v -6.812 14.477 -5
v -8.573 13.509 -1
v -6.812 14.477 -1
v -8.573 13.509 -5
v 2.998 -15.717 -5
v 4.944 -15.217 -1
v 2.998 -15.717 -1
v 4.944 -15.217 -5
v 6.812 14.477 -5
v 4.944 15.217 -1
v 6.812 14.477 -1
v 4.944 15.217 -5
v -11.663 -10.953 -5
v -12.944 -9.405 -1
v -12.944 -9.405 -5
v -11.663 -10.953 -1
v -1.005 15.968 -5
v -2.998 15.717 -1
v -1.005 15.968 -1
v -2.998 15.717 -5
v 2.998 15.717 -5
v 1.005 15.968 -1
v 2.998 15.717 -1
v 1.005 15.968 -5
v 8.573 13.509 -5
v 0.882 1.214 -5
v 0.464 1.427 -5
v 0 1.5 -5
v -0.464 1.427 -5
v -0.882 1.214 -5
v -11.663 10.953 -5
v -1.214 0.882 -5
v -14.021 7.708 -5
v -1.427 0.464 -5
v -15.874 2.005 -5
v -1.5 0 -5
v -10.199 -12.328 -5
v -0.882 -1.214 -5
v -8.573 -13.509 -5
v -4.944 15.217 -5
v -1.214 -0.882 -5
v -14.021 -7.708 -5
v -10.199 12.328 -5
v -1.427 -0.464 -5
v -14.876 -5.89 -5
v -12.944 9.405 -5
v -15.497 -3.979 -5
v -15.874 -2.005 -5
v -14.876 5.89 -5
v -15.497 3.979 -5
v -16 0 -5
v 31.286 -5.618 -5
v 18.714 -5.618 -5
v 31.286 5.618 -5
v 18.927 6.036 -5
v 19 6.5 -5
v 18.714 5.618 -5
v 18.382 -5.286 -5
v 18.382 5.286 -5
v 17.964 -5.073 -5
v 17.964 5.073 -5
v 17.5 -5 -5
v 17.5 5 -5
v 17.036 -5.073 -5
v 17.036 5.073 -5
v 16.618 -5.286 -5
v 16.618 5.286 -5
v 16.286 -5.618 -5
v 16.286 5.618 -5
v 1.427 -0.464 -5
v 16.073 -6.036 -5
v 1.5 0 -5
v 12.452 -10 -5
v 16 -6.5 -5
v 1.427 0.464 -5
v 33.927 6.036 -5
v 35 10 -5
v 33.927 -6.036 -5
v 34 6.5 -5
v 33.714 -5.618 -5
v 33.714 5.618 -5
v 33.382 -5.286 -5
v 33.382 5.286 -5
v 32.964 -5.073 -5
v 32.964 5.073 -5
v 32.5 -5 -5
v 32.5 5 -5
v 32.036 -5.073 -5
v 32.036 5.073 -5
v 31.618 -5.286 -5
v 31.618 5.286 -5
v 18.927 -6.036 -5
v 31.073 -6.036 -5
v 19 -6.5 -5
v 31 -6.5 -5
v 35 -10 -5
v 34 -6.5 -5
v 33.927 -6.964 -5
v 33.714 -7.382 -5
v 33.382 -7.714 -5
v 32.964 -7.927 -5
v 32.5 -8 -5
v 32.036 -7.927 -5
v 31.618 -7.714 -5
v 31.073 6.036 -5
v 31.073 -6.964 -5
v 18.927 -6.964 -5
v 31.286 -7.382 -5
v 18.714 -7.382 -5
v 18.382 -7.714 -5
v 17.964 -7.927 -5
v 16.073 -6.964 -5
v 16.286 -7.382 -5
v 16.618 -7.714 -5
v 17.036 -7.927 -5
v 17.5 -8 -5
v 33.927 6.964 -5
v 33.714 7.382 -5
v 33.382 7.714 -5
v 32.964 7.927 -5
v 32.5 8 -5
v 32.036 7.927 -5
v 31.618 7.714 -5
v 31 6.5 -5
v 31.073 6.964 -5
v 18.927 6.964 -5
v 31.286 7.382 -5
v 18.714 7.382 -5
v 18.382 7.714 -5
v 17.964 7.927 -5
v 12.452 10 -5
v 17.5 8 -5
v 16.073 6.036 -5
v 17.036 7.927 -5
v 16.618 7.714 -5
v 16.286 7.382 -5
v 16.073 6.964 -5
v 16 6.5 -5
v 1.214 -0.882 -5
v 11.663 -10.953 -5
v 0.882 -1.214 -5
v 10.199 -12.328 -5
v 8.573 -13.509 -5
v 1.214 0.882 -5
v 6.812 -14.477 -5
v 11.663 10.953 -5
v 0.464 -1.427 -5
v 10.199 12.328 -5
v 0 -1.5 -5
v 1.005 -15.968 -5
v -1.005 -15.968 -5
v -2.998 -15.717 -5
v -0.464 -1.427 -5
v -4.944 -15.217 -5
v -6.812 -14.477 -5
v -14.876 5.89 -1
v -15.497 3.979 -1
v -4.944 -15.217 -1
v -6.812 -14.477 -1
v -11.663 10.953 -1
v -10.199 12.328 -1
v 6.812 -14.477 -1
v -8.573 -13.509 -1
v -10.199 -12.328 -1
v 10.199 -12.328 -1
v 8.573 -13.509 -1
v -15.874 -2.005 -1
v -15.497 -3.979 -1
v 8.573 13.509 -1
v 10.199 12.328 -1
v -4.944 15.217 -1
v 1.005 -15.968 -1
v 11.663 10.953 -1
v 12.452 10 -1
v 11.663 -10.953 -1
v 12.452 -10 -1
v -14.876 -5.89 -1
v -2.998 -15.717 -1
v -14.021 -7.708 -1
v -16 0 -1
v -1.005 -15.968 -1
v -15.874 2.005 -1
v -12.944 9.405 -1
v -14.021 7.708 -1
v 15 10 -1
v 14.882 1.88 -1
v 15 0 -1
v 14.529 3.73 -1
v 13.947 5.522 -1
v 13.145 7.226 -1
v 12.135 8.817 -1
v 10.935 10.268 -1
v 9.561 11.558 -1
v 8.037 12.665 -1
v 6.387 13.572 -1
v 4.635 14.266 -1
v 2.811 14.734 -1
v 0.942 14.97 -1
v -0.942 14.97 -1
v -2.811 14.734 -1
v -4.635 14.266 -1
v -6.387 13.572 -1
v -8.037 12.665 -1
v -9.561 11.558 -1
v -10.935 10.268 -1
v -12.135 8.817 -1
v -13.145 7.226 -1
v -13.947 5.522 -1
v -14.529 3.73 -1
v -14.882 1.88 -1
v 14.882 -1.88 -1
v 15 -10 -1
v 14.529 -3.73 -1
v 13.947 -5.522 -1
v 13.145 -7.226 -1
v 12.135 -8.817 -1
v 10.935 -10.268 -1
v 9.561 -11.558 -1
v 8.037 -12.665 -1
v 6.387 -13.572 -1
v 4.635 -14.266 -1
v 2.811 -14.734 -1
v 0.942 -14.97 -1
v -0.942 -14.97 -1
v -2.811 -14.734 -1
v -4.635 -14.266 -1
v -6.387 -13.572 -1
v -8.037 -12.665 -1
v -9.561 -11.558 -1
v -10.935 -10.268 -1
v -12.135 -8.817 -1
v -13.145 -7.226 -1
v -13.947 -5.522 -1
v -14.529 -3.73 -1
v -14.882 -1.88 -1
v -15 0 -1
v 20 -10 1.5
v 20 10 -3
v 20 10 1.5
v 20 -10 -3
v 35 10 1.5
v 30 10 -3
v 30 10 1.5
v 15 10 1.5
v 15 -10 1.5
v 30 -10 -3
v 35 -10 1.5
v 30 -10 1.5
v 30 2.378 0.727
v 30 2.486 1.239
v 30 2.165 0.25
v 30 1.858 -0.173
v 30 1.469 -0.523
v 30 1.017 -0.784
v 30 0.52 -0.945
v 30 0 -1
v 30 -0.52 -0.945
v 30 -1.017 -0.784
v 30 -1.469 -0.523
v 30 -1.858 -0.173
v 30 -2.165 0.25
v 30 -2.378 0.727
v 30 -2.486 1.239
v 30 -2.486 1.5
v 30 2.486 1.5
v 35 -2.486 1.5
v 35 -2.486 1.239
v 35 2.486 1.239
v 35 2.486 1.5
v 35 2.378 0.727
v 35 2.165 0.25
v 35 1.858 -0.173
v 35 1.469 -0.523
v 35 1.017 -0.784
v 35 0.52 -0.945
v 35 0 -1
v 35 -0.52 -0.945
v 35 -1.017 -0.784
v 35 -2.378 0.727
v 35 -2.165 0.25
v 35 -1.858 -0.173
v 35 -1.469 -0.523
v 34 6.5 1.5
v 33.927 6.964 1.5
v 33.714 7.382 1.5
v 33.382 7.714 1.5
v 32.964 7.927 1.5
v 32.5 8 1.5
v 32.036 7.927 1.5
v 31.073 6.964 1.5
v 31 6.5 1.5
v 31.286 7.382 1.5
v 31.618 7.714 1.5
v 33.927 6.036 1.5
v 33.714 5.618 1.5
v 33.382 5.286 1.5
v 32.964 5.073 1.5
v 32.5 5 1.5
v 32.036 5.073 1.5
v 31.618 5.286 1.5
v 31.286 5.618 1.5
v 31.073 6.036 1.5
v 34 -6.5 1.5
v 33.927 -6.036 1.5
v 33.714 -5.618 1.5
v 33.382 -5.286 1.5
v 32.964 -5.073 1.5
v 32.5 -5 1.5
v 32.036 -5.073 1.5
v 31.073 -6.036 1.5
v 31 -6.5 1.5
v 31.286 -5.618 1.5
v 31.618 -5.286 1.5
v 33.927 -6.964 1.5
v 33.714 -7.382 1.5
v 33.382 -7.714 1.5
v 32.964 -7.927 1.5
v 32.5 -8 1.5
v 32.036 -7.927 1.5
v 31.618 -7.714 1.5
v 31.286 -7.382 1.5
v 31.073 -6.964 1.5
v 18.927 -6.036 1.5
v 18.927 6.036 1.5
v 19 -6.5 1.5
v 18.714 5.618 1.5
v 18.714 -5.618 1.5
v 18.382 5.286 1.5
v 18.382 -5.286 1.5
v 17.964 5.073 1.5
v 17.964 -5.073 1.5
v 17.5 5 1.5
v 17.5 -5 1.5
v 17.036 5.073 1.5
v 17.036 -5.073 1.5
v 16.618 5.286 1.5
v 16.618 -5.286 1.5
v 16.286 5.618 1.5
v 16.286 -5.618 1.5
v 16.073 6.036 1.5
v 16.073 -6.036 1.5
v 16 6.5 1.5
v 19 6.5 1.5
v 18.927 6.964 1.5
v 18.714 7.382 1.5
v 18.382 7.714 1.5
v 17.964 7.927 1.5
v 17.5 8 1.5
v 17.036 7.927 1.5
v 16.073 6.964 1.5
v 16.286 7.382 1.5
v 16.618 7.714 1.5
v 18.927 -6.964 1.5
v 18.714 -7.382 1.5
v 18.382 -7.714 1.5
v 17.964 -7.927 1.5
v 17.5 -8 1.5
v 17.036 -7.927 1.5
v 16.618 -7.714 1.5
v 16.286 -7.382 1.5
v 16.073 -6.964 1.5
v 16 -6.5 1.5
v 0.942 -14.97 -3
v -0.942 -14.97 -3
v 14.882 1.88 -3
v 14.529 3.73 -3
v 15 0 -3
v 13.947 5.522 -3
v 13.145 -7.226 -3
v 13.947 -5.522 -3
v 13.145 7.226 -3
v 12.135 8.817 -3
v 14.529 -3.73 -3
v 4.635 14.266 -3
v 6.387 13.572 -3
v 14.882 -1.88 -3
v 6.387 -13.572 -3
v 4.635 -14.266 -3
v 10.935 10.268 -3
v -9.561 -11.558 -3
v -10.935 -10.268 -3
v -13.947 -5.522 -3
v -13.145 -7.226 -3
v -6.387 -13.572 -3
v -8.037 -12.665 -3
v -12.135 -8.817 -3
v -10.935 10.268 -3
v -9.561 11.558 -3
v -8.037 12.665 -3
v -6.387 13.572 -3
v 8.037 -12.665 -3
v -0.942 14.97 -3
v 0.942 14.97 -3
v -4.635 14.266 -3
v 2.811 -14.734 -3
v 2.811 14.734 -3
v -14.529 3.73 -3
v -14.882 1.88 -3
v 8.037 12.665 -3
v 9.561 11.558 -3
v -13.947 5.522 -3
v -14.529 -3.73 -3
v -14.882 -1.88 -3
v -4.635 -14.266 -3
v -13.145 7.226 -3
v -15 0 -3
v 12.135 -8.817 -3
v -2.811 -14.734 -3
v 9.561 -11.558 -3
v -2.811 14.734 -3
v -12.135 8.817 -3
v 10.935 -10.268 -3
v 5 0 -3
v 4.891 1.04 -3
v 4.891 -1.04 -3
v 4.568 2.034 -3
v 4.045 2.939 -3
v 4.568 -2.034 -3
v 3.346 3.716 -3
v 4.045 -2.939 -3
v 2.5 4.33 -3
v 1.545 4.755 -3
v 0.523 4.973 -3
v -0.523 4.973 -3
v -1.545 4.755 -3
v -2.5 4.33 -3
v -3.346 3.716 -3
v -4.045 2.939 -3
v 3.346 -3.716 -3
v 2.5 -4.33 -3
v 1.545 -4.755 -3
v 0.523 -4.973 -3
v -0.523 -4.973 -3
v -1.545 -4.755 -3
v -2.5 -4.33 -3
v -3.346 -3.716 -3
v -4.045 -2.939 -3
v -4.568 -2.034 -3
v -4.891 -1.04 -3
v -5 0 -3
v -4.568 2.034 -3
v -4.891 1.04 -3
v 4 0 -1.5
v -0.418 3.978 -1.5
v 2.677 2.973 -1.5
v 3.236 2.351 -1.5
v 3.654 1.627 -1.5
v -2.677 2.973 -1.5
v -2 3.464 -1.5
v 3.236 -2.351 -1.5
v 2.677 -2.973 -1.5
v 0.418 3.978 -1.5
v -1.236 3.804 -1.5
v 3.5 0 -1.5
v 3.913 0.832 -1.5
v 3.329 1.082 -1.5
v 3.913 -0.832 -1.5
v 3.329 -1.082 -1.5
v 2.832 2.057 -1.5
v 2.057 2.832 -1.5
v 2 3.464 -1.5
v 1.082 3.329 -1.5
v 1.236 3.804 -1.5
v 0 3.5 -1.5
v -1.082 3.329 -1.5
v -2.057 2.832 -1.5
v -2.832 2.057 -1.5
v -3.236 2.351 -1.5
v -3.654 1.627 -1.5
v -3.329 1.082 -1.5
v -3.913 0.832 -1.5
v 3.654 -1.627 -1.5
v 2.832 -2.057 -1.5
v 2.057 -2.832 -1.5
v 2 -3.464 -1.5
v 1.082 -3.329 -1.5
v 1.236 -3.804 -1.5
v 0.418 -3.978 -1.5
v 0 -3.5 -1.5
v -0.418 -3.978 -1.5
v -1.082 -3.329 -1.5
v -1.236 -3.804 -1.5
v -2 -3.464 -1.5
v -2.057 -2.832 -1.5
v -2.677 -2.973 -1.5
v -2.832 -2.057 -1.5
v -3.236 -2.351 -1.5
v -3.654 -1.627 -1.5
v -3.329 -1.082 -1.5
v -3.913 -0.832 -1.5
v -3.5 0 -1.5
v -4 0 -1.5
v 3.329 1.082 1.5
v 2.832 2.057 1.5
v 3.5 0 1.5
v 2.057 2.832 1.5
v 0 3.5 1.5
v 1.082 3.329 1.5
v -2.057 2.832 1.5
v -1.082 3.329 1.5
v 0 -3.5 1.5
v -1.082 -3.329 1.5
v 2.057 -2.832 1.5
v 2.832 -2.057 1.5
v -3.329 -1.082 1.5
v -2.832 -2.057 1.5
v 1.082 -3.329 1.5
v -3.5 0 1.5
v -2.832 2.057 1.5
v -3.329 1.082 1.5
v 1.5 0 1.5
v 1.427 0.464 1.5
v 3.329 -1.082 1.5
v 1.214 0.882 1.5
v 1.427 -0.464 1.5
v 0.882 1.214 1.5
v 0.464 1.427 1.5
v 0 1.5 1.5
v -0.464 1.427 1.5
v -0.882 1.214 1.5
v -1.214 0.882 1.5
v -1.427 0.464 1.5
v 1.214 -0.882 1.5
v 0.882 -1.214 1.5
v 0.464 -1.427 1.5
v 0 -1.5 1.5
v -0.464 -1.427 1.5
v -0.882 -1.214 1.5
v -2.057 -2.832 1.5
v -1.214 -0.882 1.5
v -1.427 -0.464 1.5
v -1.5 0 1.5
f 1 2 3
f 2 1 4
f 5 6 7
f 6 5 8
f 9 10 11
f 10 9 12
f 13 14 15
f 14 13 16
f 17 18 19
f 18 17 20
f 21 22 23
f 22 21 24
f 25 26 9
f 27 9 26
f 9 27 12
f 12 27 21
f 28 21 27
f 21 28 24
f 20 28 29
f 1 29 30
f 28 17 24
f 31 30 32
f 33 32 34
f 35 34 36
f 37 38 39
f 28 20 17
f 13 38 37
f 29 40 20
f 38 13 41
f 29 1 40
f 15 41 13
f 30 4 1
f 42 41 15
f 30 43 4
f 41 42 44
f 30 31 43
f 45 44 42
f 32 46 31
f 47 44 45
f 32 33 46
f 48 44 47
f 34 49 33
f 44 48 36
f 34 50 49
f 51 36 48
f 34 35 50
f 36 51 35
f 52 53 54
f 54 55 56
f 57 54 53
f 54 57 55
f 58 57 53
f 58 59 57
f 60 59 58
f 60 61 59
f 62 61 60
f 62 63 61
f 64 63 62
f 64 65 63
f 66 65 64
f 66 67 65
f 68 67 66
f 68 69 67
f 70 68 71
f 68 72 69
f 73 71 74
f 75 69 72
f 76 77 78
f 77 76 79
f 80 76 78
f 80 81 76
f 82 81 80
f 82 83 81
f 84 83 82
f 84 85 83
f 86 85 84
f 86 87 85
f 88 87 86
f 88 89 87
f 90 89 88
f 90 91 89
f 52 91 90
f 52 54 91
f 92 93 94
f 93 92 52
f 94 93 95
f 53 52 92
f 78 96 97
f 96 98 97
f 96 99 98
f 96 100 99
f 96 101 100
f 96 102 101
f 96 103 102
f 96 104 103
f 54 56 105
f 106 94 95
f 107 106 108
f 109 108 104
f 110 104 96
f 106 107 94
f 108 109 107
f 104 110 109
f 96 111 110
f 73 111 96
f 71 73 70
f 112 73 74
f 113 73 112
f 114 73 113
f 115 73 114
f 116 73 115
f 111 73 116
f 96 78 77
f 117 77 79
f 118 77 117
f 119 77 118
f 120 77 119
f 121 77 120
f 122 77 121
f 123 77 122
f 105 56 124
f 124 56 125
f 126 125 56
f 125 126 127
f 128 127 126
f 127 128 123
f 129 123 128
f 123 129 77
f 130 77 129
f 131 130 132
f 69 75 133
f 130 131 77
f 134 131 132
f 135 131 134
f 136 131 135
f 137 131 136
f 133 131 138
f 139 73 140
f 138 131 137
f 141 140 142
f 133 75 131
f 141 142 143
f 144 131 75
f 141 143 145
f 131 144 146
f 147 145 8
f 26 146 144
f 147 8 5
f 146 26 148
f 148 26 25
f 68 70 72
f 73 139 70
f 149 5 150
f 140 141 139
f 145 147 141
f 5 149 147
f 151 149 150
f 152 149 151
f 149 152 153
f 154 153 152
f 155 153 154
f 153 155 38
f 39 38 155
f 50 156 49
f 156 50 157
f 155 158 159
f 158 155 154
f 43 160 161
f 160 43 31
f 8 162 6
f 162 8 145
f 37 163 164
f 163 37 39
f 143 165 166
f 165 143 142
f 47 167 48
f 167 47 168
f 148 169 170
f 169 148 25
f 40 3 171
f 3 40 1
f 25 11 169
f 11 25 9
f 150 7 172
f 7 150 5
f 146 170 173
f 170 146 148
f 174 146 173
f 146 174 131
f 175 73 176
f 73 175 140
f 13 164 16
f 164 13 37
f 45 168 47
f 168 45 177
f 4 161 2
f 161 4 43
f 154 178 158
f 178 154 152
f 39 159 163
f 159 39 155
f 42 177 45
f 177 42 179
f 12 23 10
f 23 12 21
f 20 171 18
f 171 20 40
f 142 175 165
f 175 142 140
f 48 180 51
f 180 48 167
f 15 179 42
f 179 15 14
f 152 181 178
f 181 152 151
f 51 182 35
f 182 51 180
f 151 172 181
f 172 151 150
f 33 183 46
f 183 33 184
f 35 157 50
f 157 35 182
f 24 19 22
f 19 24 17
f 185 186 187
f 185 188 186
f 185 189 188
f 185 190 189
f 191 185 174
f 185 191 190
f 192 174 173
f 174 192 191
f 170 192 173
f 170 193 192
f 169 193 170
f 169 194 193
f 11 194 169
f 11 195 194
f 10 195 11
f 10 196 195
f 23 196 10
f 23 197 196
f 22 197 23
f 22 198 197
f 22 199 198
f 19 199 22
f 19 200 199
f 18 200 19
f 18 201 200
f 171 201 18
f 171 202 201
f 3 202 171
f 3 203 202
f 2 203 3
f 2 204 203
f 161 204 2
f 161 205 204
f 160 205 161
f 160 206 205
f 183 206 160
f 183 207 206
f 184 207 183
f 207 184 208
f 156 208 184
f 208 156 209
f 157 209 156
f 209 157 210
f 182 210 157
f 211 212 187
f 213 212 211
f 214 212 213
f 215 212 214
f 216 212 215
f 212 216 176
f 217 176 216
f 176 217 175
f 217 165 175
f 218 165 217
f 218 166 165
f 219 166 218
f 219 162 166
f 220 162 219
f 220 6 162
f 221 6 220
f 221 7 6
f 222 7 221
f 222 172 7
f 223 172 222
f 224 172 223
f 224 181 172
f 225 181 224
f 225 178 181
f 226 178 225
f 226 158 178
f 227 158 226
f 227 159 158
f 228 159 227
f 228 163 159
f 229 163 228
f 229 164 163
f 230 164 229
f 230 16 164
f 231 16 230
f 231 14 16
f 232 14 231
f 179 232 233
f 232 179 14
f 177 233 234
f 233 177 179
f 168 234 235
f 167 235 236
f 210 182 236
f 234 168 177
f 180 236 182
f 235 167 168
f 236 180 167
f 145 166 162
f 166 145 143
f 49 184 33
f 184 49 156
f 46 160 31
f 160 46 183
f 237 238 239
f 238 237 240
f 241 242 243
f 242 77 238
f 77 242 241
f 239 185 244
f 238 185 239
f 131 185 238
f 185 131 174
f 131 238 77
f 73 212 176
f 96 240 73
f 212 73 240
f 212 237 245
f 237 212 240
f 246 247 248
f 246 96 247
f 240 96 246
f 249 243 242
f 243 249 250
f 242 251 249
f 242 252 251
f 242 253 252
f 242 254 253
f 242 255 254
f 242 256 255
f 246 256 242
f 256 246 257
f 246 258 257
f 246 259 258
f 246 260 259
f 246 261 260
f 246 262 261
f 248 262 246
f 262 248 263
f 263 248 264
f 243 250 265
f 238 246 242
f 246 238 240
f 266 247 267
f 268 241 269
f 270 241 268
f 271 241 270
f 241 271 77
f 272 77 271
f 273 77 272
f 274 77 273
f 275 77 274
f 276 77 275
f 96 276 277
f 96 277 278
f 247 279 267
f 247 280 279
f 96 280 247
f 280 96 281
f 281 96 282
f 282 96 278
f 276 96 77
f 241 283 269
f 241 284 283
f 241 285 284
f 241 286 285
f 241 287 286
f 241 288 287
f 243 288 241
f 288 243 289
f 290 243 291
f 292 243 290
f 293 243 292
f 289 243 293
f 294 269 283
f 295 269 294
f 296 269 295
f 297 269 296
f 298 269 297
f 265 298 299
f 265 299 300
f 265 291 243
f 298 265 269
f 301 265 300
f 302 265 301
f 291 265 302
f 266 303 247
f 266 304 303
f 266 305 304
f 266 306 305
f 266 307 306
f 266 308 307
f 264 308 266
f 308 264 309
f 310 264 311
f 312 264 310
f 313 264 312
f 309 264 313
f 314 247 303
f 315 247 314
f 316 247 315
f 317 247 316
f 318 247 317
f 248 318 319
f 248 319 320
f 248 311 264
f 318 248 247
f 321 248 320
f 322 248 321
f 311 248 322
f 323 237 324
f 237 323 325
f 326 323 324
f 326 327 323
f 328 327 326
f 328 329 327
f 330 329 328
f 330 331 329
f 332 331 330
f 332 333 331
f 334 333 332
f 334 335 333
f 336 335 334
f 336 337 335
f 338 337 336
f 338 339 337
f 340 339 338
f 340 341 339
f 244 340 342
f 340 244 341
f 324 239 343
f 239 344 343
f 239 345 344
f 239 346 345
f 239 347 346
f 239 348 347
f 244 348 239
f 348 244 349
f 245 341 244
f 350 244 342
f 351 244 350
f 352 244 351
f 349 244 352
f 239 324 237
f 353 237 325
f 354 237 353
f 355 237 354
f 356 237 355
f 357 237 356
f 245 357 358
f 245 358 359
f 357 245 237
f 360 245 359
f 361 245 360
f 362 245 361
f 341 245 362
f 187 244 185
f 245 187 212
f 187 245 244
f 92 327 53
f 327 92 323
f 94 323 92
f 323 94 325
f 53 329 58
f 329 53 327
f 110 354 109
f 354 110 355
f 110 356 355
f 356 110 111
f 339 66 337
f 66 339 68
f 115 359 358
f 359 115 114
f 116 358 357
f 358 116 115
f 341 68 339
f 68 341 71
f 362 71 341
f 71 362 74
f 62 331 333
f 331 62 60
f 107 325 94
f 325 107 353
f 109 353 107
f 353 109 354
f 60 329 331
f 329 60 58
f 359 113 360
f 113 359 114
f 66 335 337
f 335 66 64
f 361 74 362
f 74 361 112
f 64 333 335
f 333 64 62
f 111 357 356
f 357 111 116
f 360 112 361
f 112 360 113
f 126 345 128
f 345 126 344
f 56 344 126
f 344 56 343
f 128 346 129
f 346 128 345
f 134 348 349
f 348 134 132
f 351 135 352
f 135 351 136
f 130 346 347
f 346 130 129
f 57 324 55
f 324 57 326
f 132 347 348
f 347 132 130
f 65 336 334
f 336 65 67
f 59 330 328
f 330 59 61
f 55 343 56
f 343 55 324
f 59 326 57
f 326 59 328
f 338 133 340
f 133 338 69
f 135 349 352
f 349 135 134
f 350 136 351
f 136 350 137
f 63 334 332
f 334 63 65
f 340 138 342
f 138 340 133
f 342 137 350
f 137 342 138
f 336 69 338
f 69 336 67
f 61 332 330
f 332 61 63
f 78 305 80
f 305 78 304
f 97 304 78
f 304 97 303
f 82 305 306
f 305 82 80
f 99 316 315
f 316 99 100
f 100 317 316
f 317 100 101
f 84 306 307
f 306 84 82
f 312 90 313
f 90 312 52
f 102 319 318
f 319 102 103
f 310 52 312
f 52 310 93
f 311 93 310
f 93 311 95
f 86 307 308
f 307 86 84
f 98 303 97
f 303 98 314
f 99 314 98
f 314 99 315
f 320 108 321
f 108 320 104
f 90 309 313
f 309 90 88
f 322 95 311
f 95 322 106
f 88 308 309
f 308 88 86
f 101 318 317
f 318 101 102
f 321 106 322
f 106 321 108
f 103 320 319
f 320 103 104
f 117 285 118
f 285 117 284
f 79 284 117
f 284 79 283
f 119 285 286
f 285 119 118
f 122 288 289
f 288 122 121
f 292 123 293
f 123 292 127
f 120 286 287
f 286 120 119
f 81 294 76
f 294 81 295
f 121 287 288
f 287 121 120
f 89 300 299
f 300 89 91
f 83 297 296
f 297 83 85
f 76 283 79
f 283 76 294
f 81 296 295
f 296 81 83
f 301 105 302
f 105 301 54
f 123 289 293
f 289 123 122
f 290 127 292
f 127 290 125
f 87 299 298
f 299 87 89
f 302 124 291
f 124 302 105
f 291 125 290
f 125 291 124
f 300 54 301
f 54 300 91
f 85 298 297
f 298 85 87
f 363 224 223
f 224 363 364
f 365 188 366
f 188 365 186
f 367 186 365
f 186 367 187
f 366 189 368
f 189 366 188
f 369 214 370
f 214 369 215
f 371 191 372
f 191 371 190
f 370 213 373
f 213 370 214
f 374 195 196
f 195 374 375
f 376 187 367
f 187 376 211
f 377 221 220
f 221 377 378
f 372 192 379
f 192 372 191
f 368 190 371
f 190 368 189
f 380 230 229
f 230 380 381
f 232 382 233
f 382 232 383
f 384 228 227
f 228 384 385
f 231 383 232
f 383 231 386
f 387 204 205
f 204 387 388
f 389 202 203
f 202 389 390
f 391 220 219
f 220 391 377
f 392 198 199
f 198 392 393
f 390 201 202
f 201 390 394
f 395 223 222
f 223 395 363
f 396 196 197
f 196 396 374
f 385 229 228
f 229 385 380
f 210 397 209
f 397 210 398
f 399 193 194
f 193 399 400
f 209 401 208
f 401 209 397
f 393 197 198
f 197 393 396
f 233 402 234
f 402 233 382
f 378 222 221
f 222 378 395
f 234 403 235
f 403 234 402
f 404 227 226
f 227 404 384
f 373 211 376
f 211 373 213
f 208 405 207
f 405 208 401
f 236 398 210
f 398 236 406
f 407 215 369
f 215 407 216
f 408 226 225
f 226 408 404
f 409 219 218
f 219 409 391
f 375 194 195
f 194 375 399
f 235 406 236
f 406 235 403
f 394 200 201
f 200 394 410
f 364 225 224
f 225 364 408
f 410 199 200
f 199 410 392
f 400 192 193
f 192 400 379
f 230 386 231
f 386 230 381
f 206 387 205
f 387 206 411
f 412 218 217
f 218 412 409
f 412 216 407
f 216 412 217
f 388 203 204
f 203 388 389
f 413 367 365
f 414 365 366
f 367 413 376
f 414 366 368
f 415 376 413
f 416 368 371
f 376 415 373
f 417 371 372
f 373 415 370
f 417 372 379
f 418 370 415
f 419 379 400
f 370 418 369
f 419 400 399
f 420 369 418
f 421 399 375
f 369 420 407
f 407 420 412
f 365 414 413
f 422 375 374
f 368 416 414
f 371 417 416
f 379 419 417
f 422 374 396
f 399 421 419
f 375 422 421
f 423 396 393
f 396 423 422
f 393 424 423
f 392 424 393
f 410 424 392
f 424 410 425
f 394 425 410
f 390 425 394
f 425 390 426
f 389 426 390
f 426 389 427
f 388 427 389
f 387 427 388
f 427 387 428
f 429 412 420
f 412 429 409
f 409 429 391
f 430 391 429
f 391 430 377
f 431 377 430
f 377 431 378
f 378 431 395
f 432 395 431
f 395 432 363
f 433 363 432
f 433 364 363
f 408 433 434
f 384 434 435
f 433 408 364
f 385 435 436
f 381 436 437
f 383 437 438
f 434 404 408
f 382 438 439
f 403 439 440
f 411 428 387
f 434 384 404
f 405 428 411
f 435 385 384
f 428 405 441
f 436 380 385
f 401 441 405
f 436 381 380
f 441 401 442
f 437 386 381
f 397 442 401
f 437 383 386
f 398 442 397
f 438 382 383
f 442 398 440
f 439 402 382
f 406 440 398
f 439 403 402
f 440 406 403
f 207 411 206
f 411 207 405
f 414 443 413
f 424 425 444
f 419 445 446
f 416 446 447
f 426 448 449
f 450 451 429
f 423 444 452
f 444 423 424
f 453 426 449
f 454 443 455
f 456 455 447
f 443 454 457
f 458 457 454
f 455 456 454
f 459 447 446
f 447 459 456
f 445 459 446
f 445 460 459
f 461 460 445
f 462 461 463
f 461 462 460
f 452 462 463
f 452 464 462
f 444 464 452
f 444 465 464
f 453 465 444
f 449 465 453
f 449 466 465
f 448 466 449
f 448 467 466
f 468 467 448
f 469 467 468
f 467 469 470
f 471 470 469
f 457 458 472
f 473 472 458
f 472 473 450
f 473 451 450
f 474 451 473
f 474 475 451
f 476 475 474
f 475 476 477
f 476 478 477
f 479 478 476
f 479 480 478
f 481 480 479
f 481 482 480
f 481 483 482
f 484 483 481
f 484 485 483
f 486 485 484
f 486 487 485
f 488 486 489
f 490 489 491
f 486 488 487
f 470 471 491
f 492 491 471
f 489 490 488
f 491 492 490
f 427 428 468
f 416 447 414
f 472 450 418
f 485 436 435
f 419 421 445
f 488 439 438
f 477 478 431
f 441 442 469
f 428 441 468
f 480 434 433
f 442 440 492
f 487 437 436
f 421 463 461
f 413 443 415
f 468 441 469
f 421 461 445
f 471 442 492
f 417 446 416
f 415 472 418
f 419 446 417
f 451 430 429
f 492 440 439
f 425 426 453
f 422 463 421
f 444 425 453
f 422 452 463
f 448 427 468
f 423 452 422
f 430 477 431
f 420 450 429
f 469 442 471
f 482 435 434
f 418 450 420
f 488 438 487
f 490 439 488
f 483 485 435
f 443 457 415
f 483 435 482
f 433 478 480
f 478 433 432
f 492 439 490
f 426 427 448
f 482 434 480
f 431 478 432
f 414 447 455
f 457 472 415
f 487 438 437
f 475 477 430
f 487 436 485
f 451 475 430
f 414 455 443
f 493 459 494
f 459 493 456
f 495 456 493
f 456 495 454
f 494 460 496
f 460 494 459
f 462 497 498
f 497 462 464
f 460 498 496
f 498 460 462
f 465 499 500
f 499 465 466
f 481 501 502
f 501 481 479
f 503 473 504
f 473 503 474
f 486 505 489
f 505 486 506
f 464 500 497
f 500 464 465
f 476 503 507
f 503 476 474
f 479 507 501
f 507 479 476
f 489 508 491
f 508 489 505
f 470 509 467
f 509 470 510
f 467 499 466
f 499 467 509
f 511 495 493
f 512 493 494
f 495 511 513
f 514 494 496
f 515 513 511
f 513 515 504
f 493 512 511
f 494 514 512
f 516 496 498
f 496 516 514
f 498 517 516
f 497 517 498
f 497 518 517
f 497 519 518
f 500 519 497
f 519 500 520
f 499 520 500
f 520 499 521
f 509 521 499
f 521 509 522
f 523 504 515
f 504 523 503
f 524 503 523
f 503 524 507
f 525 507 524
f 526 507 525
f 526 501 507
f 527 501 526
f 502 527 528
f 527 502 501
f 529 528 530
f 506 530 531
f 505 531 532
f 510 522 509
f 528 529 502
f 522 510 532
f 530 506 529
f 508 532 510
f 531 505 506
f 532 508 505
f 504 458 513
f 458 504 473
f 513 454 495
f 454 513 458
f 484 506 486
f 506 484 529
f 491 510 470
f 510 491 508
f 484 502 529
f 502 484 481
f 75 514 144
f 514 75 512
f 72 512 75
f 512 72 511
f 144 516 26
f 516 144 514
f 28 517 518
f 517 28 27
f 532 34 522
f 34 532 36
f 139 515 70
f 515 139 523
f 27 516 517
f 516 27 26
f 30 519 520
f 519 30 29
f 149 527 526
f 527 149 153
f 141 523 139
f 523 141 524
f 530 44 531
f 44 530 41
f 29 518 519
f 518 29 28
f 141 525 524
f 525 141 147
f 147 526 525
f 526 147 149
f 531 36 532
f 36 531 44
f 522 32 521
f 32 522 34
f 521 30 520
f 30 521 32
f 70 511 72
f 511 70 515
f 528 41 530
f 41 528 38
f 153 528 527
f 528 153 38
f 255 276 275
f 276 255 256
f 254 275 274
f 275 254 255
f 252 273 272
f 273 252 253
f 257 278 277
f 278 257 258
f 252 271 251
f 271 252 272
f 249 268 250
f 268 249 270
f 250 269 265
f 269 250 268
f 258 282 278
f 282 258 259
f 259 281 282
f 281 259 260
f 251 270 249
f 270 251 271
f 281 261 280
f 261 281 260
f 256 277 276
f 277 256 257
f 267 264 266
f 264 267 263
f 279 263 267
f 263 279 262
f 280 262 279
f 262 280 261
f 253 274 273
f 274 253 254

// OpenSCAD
part="arm";
if(part=="arm") arm();
else if(part=="skin") skin();
else if(part=="all") {
  translate([0,0,2]) arm();
  translate([0,0,5]) mirror([0,0,1]) arm();
  %skin();
}
module arm(){
  difference(){
    translate([0,0,-5]) {
      translate([0,0,2]) cylinder(d1=10,d2=8,h=1.5,$fn=30);
      translate([0,0,3.5]) cylinder(d=7,h=3,$fn=20);
      difference() { union() {
          cylinder(d=32,h=4,$fn=50);
          translate([0,-10]) cube([20,20,4]);
          translate([20,-10]) cube([10,20,2]);
          translate([30,-10]) cube([5,20,6.5]);
          translate([15,-10]) cube([5,20,6.5]);
        }
        translate([17.5,-6.5,-.01]) cylinder(d=3,h=10,$fn=20);
        translate([17.5,6.5,-.01]) cylinder(d=3,h=10,$fn=20);
        translate([32.5,-6.5,-.01]) cylinder(d=3,h=10,$fn=20);
        translate([32.5,6.5,-.01]) cylinder(d=3,h=10,$fn=20);
        translate([0,0,2]) cylinder(d=30,h=2.02,$fn=50);
      }
    }
    translate([0,0,-5.01]) cylinder(d=3,h=6.52,$fn=20);
    translate([35.01,0,1.5]) rotate([0,-90]) cylinder(d=5,h=6,$fn=30);
  }
}
module skin() {
  difference(){
    cylinder(d=28,h=7,$fn=50);
    translate([0,0,-.01]) cylinder(d=22.6,h=7.02,$fn=50);
    translate([0,0,3.5]) rotate_extrude($fn=50) {
      translate([15,0,0]) scale([1.5,2]) circle(d=3.5,$fn=30);
    }
  }
}
